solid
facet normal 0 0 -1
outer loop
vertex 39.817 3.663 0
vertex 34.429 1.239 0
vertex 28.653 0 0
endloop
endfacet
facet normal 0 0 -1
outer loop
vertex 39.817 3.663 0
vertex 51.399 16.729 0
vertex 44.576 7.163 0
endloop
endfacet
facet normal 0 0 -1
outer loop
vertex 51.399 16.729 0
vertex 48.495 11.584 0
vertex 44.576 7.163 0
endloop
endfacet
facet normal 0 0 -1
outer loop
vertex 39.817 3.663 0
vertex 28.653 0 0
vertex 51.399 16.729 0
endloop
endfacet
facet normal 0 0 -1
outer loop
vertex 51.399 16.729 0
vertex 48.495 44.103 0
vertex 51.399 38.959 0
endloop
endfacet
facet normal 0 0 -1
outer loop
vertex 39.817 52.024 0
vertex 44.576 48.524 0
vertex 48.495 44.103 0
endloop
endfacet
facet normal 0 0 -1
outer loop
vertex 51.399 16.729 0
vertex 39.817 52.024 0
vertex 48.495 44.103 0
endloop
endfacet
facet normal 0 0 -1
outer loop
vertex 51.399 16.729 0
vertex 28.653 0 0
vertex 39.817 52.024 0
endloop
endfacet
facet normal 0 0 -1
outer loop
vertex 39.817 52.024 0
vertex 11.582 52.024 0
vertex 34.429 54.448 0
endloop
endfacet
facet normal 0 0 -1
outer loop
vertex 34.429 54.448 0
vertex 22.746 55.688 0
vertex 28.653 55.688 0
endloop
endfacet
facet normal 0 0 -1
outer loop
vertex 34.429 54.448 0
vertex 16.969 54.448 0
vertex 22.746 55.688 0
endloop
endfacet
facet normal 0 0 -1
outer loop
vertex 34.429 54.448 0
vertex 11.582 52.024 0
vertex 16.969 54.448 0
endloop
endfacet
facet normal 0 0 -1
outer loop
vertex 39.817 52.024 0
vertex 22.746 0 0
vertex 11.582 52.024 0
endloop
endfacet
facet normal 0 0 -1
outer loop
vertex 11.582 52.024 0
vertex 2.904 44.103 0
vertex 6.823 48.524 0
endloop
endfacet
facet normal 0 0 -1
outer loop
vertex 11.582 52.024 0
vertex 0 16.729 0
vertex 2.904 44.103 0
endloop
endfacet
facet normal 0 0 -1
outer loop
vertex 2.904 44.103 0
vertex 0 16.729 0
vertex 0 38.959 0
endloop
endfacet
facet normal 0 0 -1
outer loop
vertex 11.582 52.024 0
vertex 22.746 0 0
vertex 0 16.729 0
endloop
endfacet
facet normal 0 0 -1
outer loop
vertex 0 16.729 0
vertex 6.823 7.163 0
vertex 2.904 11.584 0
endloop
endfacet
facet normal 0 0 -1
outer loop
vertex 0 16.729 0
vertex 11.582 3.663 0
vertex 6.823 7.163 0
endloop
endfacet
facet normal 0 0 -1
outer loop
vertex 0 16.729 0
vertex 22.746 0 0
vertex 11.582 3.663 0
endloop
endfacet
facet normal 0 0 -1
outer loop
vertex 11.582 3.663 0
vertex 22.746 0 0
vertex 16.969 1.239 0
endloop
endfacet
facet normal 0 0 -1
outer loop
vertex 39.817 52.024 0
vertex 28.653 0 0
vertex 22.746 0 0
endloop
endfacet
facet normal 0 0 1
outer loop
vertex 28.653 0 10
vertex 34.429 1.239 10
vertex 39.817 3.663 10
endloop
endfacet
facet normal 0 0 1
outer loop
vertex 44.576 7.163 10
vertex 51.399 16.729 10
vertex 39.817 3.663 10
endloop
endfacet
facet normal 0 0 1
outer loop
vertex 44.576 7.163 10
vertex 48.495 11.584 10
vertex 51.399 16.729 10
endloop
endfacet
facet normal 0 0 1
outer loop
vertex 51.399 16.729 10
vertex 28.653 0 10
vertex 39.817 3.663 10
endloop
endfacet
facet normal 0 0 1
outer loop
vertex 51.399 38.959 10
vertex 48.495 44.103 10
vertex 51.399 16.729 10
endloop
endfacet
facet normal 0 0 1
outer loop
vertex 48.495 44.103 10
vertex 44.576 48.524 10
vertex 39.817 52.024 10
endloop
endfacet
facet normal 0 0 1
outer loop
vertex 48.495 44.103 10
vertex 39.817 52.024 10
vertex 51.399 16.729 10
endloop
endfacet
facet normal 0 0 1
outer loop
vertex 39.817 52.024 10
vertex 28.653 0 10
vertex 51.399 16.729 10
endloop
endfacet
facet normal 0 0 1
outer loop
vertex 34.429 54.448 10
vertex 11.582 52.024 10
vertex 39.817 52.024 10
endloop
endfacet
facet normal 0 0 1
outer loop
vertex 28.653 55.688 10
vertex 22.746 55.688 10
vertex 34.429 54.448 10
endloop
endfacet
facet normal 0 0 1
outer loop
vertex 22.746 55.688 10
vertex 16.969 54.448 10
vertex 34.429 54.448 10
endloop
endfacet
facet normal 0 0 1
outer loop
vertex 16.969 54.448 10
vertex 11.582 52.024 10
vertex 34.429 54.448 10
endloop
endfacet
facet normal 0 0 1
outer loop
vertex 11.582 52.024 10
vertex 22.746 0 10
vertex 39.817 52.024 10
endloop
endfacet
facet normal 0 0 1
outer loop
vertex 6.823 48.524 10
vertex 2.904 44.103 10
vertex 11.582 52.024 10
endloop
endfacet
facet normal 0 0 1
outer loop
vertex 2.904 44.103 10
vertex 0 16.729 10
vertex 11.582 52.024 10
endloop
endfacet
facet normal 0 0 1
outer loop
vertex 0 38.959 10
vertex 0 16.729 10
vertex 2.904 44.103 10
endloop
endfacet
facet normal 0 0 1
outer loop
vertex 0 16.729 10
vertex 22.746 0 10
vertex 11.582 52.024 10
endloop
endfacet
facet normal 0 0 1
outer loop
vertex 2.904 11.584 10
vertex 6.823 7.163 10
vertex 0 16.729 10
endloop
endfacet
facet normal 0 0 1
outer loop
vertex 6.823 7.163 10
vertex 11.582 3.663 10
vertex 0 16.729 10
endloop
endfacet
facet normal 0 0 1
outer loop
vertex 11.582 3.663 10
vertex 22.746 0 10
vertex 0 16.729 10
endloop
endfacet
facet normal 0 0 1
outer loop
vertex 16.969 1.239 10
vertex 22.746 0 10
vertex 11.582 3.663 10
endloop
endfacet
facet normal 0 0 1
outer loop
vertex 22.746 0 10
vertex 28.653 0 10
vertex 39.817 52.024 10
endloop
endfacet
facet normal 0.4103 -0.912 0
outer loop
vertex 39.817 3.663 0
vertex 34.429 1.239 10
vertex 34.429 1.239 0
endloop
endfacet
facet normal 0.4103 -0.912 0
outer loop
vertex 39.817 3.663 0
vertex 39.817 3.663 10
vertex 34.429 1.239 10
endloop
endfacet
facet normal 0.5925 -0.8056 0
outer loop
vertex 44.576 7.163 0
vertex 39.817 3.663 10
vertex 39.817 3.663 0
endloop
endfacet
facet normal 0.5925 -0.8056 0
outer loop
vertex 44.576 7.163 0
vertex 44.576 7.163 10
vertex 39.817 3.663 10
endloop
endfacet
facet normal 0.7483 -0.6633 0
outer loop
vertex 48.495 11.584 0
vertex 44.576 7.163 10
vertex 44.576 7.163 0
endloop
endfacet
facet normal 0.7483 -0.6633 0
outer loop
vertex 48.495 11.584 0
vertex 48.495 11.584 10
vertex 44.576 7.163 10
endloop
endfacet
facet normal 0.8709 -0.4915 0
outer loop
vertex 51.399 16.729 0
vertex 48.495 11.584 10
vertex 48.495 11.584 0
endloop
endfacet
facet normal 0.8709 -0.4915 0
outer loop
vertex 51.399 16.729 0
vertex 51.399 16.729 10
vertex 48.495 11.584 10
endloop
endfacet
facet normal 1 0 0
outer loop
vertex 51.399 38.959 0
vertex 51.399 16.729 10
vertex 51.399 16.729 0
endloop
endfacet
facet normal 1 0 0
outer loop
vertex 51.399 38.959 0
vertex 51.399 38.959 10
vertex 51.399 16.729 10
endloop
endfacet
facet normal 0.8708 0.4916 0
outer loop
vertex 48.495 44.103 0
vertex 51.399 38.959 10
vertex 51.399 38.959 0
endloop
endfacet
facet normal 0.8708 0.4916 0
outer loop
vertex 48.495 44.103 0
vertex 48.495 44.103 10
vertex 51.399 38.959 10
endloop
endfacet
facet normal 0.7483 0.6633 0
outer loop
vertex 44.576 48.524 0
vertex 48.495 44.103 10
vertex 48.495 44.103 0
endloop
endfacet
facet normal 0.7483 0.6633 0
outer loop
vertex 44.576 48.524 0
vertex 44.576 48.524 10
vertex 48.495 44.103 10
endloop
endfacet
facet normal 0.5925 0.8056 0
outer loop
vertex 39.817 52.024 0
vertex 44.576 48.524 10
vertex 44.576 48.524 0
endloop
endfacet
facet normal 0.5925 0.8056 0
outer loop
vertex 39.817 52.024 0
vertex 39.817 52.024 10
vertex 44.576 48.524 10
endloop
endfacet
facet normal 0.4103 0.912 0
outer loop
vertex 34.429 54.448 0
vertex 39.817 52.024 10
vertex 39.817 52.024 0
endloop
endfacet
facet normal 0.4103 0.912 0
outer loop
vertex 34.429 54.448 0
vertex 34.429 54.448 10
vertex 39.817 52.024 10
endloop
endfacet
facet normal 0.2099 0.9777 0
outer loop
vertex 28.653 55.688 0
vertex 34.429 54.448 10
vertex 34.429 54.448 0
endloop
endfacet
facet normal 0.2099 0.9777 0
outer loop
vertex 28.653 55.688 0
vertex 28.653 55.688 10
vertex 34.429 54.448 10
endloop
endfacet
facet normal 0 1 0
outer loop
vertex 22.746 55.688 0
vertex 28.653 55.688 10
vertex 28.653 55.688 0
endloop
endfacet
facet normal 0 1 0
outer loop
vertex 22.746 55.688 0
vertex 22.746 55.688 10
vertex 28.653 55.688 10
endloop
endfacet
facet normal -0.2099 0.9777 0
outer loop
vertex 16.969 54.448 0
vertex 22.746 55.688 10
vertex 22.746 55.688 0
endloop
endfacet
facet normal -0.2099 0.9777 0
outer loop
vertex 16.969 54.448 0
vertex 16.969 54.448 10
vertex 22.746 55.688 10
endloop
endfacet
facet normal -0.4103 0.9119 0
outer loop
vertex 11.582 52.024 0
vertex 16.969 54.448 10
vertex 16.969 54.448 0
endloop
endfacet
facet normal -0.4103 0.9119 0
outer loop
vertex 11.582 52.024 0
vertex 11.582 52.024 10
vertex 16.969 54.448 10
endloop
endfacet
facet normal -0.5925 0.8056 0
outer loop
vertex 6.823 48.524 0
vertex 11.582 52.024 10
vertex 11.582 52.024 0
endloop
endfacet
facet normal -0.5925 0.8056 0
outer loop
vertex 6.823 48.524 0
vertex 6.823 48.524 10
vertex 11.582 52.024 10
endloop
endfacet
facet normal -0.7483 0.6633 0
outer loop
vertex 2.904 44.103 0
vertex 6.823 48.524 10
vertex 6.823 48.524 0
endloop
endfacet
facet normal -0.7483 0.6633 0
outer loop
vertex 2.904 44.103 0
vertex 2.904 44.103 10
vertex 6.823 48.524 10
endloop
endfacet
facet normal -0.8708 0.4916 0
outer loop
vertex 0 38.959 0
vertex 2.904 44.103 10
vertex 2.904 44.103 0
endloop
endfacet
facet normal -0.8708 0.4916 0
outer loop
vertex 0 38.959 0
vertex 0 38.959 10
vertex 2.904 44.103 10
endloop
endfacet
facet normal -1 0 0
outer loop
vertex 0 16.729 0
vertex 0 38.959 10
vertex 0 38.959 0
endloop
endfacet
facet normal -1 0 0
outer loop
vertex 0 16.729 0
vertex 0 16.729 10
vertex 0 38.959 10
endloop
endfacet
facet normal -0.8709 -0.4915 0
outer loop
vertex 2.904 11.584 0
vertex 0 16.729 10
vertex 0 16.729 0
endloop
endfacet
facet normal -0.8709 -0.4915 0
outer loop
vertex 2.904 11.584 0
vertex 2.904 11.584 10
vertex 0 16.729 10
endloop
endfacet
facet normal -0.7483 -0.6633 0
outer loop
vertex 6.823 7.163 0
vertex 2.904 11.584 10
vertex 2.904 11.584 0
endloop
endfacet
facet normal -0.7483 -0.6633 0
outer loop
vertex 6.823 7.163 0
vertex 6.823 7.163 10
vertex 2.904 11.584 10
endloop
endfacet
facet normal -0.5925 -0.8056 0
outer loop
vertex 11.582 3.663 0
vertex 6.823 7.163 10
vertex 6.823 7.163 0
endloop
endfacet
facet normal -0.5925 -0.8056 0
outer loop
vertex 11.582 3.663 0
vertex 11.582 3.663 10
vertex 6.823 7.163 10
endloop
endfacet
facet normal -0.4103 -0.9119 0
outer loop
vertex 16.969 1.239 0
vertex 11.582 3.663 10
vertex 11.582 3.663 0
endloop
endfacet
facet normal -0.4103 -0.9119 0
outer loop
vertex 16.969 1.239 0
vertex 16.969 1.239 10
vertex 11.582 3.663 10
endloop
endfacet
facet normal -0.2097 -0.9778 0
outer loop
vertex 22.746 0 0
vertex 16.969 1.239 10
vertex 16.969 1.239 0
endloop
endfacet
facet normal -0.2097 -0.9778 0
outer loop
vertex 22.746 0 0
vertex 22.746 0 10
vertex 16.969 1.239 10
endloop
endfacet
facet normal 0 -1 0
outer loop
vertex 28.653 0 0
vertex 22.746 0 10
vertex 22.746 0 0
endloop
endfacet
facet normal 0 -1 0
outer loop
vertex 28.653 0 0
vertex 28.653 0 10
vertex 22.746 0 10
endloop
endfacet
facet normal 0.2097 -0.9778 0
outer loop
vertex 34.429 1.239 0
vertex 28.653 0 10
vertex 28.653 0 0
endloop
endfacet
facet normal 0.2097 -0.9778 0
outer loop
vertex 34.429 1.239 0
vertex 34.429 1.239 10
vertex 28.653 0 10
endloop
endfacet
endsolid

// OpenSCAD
$fn = 32;
// ----------------------------------------------------------------------
// Flat adaptor: double_d, 10 mm thick
// ----------------------------------------------------------------------

// --- parameters (mm) ---
profile_height = 10;      // extrusion height
profile_points = 24;      // points of the closed outline

profile = [[51.399, 38.959], [48.495, 44.103], [44.576, 48.524], [39.817, 52.024], [34.429, 54.448], [28.653, 55.688], [22.746, 55.688], [16.969, 54.448], [11.582, 52.024], [6.823, 48.524], [2.904, 44.103], [0, 38.959], [0, 16.729], [2.904, 11.584], [6.823, 7.163], [11.582, 3.663], [16.969, 1.239], [22.746, 0], [28.653, 0], [34.429, 1.239], [39.817, 3.663], [44.576, 7.163], [48.495, 11.584], [51.399, 16.729]];  // single closed polygon, 24 points, counter clockwise

// --- the one profile operation ---
linear_extrude(height = profile_height) polygon(points = profile);
